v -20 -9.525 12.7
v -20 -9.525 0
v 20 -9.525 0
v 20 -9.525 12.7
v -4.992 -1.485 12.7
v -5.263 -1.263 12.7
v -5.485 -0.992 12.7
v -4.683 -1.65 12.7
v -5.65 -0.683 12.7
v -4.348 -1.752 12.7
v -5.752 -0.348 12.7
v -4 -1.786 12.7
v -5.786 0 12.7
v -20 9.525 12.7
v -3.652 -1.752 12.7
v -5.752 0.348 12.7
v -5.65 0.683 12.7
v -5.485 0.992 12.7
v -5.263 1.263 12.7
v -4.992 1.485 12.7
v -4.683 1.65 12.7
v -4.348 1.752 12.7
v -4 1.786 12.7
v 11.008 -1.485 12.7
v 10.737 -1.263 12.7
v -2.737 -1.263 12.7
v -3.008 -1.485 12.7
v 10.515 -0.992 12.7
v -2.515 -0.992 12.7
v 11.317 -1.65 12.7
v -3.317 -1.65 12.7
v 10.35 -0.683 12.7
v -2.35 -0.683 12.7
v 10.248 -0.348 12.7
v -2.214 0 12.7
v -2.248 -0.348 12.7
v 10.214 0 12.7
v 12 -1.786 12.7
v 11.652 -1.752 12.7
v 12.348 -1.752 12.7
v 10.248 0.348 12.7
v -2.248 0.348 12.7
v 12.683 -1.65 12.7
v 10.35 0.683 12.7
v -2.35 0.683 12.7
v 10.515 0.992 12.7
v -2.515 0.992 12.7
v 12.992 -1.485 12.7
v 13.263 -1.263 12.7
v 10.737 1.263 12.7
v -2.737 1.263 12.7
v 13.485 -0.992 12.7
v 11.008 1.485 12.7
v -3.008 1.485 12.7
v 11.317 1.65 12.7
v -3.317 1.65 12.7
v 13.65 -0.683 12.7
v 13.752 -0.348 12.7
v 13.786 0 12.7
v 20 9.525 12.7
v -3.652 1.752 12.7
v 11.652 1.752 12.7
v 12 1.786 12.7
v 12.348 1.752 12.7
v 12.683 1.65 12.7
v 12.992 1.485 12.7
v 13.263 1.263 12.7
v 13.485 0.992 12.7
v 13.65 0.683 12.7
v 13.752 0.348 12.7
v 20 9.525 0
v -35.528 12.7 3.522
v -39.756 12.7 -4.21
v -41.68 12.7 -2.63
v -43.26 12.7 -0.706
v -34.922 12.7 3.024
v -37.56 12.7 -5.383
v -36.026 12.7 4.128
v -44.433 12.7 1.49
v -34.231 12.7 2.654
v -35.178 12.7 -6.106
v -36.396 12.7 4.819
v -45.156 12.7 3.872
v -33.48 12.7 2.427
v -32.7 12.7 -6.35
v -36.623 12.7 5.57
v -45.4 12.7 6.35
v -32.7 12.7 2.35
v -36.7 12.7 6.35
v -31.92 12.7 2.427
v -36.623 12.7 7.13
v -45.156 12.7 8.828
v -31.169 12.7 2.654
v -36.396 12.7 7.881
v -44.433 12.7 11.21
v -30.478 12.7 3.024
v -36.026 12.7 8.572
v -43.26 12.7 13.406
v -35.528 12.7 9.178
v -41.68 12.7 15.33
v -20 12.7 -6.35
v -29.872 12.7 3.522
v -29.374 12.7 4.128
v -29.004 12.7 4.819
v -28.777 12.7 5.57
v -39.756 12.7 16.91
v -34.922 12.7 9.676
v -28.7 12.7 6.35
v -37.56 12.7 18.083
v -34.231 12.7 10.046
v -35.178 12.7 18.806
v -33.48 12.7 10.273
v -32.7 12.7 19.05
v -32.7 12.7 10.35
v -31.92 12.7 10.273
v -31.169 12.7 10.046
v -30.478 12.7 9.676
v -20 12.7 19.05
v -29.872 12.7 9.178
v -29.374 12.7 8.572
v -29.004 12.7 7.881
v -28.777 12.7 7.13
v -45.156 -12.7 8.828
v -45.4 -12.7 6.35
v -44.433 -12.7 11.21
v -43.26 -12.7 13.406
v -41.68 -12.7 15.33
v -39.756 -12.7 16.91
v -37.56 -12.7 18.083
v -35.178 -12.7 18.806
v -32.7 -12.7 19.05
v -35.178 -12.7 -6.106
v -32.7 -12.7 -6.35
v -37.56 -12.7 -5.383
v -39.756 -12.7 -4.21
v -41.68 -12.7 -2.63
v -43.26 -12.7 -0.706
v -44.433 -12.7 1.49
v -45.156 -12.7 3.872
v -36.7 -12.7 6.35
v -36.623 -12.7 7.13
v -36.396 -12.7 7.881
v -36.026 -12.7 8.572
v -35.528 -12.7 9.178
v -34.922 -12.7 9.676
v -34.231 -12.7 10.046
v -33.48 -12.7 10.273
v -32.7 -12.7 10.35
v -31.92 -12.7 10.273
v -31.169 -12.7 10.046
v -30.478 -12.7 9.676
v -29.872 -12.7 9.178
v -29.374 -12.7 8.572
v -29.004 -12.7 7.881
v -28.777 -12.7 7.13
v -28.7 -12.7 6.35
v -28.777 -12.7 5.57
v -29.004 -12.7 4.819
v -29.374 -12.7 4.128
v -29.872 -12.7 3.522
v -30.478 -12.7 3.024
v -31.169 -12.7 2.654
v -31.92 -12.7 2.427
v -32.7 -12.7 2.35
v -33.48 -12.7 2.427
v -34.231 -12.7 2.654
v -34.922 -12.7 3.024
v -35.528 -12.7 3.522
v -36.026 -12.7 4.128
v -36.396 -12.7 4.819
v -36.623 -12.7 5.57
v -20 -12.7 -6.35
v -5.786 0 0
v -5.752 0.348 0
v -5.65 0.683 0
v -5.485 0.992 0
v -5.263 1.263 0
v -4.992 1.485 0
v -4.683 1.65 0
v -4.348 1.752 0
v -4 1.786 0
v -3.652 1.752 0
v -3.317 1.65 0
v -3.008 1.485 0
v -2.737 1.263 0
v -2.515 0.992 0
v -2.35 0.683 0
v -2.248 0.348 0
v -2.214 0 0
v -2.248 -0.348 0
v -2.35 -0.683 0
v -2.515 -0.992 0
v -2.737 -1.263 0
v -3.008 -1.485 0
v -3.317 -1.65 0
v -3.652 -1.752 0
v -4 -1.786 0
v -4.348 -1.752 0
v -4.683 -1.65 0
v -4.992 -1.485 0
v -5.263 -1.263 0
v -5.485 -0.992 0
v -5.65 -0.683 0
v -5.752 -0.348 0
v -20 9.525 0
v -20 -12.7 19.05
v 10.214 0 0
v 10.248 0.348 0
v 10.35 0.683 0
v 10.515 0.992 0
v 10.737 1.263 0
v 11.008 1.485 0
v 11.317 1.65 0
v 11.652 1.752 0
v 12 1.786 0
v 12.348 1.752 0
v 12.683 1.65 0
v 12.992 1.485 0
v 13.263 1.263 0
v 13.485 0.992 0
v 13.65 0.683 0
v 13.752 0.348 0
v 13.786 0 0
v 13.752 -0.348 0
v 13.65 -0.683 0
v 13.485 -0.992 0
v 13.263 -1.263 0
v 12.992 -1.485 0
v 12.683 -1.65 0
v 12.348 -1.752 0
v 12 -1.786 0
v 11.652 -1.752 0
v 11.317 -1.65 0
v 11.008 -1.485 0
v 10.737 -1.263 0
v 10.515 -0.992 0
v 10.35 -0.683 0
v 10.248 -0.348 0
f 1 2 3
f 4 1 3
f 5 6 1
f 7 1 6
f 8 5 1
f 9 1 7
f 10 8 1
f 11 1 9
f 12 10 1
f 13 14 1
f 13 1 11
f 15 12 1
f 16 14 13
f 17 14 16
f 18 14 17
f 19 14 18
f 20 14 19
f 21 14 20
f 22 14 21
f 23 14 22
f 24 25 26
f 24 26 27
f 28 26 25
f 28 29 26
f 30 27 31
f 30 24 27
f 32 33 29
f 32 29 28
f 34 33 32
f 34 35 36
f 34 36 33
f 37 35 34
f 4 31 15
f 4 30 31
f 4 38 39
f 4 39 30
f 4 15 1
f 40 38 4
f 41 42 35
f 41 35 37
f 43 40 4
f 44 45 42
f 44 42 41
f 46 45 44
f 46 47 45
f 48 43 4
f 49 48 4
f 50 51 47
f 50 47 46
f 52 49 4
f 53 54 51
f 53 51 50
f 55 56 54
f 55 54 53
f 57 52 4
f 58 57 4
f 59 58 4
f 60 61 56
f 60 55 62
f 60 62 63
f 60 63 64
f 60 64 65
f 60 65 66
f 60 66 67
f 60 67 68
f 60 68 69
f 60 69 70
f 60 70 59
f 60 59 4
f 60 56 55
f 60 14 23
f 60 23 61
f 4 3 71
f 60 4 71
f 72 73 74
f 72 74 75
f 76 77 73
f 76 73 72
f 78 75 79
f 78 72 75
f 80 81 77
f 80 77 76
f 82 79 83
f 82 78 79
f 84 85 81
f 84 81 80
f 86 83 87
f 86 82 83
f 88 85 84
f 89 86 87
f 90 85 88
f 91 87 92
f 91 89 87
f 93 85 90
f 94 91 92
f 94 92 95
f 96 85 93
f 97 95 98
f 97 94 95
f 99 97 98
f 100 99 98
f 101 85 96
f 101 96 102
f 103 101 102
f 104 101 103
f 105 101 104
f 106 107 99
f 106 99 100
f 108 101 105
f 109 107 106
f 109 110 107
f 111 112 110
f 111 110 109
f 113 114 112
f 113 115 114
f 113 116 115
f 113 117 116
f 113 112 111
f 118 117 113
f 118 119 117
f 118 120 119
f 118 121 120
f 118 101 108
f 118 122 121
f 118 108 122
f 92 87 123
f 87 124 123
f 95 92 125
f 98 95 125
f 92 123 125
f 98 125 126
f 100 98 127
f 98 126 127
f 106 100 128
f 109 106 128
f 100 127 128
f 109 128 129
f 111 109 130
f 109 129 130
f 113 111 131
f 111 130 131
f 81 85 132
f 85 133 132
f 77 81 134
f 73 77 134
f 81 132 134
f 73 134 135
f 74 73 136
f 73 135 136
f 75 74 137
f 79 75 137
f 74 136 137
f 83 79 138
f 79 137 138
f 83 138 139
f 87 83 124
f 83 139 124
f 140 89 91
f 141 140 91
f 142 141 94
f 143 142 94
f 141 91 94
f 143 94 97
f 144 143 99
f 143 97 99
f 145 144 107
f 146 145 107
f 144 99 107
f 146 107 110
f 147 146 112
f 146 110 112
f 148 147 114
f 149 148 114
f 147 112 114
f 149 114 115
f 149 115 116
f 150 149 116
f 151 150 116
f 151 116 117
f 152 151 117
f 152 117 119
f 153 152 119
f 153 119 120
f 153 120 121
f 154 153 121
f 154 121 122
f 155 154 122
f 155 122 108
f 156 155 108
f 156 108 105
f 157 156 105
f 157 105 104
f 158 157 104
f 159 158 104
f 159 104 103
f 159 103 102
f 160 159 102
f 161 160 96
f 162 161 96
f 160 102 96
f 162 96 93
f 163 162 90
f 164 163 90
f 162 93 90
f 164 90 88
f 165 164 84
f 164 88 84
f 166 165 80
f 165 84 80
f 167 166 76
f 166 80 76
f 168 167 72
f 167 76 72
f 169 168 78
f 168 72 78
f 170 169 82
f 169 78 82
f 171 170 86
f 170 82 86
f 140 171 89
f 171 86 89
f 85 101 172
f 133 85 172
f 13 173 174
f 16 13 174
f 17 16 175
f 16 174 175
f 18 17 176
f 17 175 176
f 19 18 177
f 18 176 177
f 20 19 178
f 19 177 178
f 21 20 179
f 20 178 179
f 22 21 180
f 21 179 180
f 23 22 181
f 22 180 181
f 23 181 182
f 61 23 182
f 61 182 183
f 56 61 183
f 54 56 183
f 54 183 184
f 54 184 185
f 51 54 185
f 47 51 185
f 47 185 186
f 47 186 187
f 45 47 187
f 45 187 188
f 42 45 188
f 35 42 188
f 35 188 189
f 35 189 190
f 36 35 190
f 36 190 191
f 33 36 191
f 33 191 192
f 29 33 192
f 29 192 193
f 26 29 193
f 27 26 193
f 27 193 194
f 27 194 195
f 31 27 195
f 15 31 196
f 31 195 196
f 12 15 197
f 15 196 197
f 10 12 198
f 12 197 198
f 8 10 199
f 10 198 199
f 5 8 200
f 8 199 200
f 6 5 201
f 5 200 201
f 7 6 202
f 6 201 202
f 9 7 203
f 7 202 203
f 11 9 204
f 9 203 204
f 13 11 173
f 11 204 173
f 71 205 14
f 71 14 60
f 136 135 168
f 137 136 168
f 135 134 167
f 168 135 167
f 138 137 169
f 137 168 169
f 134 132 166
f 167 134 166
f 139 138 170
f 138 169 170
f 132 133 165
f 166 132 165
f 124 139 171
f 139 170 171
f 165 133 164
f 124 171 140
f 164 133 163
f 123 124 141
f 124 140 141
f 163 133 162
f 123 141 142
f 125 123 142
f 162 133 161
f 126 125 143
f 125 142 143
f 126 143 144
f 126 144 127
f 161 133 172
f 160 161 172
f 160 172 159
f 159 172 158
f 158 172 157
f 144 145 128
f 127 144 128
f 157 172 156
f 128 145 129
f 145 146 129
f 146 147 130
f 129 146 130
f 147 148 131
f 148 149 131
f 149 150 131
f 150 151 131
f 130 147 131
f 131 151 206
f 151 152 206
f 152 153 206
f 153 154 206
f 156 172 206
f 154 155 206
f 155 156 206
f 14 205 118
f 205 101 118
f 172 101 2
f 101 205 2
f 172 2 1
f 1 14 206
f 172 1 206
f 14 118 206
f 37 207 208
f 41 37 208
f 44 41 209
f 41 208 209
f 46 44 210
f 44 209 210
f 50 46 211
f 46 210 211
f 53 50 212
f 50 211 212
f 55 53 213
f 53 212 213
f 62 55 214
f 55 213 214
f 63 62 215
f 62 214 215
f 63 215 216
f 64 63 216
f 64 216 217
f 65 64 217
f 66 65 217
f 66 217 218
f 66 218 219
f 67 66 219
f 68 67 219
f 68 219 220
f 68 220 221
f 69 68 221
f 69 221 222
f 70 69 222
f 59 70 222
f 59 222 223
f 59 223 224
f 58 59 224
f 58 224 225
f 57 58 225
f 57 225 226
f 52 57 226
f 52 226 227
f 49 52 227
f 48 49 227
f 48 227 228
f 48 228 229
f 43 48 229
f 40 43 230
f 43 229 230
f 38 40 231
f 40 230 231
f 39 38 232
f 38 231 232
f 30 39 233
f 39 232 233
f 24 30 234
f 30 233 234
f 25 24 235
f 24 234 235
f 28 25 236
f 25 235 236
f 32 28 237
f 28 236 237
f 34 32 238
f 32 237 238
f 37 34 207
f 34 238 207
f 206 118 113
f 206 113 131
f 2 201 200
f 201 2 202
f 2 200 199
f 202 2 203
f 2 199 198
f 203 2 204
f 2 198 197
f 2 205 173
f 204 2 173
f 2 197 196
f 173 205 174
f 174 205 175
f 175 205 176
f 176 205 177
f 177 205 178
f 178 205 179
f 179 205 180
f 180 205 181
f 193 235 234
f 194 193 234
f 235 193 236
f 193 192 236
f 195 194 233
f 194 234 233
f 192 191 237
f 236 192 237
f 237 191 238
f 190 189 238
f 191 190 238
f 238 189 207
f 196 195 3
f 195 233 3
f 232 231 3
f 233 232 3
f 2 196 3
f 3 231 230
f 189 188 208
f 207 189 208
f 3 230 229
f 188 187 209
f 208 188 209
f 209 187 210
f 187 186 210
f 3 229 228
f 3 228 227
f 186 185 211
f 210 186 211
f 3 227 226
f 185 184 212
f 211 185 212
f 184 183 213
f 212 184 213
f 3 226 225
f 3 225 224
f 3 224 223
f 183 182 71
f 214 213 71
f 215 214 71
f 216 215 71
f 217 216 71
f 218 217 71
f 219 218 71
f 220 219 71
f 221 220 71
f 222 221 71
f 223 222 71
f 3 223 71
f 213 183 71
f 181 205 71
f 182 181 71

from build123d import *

# Parameters (mm, degrees)
F0_W     = 40
F0_H     = 19.05
F1_DEPTH = 12.7
F2_W     = 25.4
F2_H     = 25.4
F2_W_2   = 19.05
F2_H_2   = 12.7
F3_DEPTH = 25.4
F5_D     = 8
F6_R     = 12.69999
F8_D     = 3.571875


# Not quite as in the source:
# - a fillet or chamfer is up to 0.001 mm smaller than in the source, because OpenCascade refuses the exact size


with BuildPart() as f1:
    # F0 (on Top) → F1 (new body)
    with BuildSketch(Plane.XY):
        Rectangle(F0_W, F0_H)
    extrude(amount=F1_DEPTH)

    # F2 (on face) → F3 (join)
    with BuildSketch(Plane(origin=(-20, 0, 0), x_dir=(0, -1, 0), z_dir=(-1, 0, 0))):
        with Locations((0, 6.35)):
            Rectangle(F2_W, F2_H)
        with Locations((0, 6.35)):
            Rectangle(F2_W_2, F2_H_2, mode=Mode.SUBTRACT)
        with Locations((0, 6.35)):
            Rectangle(F2_W_2, F2_H_2)
    extrude(amount=F3_DEPTH)

    # F5 (through all)
    with Locations(Plane.XZ.offset(12.7)):
        with Locations((-32.7, 6.35)):
            Hole(F5_D / 2)

    # F6 (radius 12.7 in the source; OpenCascade refuses exactly that, so slightly less here)
    f6_edges = [f1.edges().sort_by_distance(p)[0] for p in [
        (-45.4, 0, 19.05),
        (-45.4, 0, -6.35),
    ]]
    fillet(f6_edges, radius=F6_R)

    # F8 (through all)
    with Locations(Plane.XY.offset(12.7)):
        with Locations((12, 0), (-4, 0)):
            Hole(F8_D / 2)


solid = f1.part
